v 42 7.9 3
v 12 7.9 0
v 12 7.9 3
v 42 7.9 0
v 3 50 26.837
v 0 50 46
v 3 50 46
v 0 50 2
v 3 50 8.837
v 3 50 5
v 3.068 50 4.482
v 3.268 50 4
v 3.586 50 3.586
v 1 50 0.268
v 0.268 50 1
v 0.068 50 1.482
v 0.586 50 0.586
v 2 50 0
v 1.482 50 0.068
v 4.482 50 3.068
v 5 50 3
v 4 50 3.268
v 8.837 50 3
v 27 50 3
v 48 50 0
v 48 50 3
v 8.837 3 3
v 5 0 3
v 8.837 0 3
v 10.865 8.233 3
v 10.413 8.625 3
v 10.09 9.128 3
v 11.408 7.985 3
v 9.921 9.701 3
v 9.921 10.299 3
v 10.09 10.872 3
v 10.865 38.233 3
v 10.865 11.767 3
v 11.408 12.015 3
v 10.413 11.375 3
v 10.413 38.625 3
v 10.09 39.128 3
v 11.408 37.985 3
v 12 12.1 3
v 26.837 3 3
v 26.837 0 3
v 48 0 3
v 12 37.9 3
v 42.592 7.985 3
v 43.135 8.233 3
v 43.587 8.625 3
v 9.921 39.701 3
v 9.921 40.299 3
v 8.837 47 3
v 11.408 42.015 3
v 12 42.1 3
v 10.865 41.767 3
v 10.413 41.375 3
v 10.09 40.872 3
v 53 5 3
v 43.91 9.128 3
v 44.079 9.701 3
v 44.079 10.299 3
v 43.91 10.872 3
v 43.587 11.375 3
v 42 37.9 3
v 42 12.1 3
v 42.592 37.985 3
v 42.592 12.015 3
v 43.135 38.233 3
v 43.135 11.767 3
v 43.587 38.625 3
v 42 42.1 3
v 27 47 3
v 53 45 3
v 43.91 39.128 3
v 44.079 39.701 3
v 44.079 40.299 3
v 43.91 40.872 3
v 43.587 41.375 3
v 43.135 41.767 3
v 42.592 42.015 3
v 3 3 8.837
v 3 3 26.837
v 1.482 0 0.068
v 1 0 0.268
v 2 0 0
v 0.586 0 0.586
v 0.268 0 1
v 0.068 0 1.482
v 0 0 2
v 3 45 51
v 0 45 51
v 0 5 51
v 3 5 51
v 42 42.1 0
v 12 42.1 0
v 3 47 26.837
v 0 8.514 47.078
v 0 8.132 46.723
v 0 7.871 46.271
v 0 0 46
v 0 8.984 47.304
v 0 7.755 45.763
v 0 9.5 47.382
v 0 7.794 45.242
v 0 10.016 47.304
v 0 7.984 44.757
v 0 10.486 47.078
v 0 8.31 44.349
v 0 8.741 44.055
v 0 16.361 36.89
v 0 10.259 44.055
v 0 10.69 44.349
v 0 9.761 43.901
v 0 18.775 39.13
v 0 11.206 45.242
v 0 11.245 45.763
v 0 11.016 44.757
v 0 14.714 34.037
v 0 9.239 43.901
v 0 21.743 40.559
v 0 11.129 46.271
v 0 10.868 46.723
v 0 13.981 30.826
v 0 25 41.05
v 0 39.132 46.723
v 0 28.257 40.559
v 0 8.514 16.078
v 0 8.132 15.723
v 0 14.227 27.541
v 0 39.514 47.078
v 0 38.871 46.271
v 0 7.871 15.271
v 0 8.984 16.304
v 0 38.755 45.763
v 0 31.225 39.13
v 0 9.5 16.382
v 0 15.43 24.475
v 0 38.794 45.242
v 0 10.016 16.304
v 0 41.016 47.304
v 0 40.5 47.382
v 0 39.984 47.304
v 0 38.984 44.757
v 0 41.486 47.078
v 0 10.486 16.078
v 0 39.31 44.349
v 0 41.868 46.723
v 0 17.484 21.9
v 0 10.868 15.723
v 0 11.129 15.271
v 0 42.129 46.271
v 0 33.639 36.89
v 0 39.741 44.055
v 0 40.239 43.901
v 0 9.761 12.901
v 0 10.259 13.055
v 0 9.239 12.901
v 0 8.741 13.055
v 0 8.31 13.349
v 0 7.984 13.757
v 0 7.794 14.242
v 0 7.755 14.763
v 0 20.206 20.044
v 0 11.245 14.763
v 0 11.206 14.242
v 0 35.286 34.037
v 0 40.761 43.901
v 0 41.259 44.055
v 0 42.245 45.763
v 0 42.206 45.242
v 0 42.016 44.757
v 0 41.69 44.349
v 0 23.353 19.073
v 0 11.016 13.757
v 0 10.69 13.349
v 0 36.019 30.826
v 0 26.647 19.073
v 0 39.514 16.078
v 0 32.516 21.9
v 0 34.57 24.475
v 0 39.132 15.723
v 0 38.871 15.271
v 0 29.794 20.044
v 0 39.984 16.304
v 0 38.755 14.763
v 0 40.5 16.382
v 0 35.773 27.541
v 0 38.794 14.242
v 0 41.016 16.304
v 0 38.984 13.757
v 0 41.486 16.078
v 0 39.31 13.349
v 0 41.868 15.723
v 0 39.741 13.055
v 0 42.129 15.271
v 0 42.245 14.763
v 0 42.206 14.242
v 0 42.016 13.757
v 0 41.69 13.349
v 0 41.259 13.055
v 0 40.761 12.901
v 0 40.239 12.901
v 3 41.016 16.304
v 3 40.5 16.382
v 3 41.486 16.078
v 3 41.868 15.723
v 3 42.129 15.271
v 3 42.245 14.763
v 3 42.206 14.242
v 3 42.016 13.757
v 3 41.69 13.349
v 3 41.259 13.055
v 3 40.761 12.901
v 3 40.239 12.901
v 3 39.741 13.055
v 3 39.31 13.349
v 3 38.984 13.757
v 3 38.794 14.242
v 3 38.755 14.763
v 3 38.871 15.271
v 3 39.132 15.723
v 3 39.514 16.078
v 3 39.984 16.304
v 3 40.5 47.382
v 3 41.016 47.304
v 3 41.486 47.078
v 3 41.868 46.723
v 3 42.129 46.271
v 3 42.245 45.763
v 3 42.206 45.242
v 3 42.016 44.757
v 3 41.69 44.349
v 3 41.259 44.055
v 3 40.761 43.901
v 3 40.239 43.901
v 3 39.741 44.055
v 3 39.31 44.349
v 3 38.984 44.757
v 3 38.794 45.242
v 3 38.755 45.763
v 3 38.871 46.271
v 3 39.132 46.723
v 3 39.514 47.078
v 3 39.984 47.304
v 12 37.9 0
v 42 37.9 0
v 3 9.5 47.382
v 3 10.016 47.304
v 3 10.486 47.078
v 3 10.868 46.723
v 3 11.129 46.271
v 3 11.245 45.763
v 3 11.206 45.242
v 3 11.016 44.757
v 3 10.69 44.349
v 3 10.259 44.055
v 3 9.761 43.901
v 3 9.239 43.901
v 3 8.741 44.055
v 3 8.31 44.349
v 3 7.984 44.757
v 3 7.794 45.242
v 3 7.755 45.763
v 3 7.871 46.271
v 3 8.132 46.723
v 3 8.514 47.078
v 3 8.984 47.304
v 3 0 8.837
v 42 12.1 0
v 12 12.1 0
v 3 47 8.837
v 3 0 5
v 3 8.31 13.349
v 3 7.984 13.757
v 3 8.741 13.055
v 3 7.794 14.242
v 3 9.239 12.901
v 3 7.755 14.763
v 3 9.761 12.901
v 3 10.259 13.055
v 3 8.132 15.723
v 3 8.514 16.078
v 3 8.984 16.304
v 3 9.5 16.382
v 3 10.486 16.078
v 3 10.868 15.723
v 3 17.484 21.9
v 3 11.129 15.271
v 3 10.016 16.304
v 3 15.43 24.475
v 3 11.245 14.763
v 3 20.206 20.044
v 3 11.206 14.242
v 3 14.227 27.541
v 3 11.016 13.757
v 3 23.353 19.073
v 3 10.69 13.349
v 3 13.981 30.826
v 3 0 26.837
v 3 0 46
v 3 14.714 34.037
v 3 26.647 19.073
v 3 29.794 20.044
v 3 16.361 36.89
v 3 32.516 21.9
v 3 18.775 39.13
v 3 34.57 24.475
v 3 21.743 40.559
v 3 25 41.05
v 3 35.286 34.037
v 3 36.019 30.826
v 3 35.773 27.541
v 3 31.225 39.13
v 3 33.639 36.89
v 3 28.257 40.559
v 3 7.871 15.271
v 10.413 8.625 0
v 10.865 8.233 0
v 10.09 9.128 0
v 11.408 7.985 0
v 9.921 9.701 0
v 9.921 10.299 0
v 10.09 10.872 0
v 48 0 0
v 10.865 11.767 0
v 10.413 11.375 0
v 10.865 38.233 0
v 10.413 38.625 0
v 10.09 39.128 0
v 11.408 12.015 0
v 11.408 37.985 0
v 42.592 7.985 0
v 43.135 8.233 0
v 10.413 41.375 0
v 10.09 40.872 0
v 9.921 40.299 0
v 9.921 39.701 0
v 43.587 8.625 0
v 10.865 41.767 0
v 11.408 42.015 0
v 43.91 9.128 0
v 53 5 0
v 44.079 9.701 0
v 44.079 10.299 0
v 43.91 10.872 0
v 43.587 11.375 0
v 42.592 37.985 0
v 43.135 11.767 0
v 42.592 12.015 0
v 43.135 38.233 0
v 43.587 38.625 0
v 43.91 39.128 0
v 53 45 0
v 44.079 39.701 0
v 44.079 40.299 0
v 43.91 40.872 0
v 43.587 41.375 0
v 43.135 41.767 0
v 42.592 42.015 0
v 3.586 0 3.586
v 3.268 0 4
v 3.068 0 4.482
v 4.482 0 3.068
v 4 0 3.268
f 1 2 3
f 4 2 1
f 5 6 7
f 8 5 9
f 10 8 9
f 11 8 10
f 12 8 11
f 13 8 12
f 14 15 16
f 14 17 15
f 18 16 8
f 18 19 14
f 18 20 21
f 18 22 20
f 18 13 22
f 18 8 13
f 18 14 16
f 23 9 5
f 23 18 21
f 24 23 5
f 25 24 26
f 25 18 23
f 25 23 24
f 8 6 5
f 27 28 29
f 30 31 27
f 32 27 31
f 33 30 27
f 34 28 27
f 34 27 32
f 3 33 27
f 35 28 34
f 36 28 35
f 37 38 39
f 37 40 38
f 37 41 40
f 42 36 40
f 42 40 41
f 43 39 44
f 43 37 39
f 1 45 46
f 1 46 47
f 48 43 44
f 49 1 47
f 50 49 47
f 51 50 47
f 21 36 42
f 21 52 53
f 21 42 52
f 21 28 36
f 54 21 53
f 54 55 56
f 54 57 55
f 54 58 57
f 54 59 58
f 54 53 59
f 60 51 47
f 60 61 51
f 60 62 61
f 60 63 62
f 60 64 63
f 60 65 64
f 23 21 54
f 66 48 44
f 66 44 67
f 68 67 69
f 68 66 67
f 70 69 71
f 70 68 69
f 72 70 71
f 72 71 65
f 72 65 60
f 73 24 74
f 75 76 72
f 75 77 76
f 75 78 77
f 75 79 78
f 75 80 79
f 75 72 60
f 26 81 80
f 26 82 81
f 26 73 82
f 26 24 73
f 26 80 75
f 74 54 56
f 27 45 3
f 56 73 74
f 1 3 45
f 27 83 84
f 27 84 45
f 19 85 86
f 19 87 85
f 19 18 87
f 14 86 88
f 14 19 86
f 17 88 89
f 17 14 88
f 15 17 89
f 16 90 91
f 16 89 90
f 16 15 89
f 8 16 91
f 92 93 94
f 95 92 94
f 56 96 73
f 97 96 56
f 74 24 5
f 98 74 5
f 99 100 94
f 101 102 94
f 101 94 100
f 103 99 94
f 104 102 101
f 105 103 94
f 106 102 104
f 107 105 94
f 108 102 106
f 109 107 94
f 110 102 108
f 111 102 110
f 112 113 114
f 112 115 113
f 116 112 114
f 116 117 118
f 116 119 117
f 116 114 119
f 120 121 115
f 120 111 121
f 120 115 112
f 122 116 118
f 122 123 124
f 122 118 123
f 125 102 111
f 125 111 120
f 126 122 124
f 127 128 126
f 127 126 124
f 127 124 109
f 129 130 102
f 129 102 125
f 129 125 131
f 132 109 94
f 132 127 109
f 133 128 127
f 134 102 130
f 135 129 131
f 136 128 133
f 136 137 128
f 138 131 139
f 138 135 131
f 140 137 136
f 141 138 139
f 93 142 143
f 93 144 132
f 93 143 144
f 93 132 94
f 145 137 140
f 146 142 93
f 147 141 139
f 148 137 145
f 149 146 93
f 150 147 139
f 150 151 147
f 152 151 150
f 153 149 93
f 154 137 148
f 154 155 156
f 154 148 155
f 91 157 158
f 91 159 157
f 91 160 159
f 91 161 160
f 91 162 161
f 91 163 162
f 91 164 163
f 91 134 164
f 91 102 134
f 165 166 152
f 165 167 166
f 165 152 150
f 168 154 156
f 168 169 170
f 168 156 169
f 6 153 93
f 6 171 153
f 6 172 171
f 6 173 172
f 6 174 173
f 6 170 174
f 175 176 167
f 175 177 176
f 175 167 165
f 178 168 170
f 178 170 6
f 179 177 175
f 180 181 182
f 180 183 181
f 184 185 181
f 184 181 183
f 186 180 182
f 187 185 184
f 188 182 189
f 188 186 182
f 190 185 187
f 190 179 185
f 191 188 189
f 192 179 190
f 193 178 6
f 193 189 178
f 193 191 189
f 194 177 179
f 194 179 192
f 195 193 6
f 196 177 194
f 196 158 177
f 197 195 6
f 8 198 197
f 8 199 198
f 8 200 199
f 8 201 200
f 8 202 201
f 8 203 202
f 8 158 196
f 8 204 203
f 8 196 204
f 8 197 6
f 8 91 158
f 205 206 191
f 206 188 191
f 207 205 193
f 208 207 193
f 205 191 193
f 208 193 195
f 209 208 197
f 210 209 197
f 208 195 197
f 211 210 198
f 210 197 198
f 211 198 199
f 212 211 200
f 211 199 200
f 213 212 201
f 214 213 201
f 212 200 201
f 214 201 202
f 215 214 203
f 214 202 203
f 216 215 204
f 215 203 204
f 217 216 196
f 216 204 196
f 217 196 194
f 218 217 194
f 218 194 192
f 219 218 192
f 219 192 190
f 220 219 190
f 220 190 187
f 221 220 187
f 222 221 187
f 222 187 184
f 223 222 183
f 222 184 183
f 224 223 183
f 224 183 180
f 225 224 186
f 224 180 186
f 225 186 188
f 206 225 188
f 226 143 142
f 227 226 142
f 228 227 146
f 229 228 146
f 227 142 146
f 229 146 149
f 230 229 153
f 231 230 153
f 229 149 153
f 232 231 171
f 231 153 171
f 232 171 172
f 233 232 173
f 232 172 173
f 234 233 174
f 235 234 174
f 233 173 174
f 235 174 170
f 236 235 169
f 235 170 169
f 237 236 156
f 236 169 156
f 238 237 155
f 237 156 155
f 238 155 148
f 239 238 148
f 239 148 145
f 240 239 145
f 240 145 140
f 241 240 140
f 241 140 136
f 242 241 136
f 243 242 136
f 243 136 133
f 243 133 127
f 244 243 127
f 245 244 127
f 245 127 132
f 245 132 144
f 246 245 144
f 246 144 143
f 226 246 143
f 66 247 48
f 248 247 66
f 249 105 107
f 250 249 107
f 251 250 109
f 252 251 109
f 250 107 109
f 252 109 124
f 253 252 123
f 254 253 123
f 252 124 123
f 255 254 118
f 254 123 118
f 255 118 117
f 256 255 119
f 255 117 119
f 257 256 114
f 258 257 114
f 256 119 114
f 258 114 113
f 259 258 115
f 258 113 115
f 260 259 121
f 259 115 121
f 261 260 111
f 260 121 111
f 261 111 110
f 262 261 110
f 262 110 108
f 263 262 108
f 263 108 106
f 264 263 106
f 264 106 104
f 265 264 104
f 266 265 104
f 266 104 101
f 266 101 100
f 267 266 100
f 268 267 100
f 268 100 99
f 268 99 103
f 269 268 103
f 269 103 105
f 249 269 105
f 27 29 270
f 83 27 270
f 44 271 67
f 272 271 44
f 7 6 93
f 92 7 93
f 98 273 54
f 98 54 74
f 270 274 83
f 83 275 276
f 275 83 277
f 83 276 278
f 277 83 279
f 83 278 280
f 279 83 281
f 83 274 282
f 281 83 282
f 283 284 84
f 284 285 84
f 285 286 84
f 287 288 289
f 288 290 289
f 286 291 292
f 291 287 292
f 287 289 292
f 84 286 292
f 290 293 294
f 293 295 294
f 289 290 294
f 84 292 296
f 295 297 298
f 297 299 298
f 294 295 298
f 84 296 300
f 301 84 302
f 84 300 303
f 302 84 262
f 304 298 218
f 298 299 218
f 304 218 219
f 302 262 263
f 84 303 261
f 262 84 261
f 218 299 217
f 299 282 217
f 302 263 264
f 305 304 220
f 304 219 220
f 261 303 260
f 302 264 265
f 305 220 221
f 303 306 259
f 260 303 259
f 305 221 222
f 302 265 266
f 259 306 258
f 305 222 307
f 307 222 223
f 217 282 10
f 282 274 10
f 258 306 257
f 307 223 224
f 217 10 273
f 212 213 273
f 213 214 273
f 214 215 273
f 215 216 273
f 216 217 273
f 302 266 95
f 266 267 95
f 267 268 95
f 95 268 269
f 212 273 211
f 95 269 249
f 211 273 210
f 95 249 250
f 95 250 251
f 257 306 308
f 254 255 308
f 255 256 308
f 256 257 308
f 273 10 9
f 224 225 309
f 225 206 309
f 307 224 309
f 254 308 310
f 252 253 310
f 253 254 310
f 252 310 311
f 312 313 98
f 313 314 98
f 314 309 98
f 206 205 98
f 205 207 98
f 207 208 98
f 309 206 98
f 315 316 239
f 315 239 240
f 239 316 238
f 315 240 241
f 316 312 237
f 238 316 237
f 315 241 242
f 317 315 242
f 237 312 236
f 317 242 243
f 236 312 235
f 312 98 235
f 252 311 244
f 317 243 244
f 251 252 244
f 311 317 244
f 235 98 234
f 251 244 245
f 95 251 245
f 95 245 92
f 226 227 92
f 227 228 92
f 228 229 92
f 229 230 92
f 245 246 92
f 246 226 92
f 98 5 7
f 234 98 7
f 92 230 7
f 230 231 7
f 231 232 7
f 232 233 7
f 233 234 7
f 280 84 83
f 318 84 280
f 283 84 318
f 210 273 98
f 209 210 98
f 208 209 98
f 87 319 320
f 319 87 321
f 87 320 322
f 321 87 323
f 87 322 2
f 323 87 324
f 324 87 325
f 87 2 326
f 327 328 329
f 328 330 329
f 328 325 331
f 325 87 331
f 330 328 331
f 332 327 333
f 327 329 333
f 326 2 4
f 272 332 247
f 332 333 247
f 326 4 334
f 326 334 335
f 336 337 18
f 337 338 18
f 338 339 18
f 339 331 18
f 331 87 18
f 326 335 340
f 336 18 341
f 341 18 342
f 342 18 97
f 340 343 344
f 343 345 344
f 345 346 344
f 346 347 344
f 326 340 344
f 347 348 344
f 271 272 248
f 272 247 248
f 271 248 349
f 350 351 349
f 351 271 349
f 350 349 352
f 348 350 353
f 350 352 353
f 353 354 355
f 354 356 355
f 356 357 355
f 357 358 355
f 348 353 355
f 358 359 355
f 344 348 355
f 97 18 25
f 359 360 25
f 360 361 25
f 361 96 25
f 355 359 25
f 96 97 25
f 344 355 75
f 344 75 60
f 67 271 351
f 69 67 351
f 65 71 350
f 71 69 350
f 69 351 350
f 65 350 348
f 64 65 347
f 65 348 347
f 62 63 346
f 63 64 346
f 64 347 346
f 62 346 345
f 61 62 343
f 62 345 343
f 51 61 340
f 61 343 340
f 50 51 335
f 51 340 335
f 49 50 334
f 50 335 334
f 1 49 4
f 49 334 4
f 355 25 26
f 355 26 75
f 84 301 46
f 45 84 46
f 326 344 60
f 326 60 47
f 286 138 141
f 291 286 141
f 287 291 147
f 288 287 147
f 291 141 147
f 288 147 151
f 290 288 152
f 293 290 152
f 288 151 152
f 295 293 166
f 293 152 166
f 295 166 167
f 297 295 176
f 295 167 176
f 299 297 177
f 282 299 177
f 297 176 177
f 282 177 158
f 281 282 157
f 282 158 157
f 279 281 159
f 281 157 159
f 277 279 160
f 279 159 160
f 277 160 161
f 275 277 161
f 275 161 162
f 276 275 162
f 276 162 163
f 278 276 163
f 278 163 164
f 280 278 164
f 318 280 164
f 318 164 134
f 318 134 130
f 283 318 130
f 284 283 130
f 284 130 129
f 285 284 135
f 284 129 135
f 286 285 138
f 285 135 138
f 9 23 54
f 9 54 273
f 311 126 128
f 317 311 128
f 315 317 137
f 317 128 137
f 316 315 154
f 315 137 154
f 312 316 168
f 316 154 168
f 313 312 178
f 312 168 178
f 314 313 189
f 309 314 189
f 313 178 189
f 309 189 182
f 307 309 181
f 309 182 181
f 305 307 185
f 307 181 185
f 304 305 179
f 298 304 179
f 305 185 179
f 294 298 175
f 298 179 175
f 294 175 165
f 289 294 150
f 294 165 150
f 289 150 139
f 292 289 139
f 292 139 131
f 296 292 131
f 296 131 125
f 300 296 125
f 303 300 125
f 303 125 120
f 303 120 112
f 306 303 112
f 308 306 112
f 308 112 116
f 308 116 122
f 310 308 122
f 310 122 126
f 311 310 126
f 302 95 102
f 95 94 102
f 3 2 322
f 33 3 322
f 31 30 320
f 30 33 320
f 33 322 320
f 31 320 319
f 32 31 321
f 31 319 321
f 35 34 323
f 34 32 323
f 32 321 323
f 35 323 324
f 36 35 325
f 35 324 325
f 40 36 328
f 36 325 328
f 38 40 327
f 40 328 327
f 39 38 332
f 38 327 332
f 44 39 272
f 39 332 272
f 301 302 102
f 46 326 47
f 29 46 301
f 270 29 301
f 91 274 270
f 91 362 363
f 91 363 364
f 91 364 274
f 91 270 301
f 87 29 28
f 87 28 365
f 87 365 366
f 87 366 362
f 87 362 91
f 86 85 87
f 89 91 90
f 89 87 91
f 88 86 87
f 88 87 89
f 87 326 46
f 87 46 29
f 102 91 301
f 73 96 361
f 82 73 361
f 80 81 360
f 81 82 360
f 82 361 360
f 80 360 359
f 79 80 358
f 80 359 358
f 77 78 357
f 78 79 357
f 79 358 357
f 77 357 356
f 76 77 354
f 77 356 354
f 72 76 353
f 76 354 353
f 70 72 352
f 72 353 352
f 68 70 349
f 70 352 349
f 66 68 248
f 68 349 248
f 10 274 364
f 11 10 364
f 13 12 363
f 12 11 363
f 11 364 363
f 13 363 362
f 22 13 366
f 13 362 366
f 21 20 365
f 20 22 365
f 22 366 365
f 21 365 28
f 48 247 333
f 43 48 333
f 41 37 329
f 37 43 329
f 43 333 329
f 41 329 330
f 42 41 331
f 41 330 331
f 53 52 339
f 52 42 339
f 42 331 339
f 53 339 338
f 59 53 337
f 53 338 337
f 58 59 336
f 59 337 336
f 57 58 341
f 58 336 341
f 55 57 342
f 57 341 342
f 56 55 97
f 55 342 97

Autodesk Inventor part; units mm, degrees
ref_plane "YZ Plane" through (0, 0, 0) normal (1, 0, 0) x (0, 1, 0)
ref_plane "XZ Plane" through (0, 0, 0) normal (0, 1, 0) x (-1, 0, 0)
ref_plane "XY Plane" through (0, 0, 0) normal (0, 0, 1) x (1, 0, 0)
sketch "Skizze1" plane through (0, 0, 0) normal (0, 0, 1) x (1, 0, 0)
  line L0 (0, 0) -> (0, 50)
  line L1 (0, 50) -> (48, 50)
  line L2 (53, 45) -> (53, 5)
  line L3 (48, 0) -> (0, 0)
  line L4 (12, 40) -> (42, 40) construction
  line L5 (12, 37.9) -> (42, 37.9)
  line L6 (42, 42.1) -> (12, 42.1)
  arc A0 (12, 42.1) -> (12, 37.9) centre (12, 40) ccw
  arc A1 (42, 37.9) -> (42, 42.1) centre (42, 40) ccw
  line L7 (12, 10) -> (42, 10) construction
  line L8 (12, 7.9) -> (42, 7.9)
  line L9 (42, 12.1) -> (12, 12.1)
  arc A2 (12, 12.1) -> (12, 7.9) centre (12, 10) ccw
  arc A3 (42, 7.9) -> (42, 12.1) centre (42, 10) ccw
  line L10 (48, 50) -> (53, 45)
  line L11 (53, 5) -> (48, 0)
  point P0 (53, 50)
  point P1 (53, 0)
  point P2 (27, 40)
  point P3 (27, 10)
  dimension "d0" = 50
  dimension "d1" = 53
  dimension "d2" = 30
  dimension "d3" = 4.2
  dimension "d4" = 10
  dimension "d5" = 11
  dimension "d6" = 4.2
  dimension "d7" = 10
  dimension "d8" = 11
  dimension "d9" = 5
  dimension "d10" = 5
  dimension "d11" = 5
  dimension "d12" = 5
extrude "Extrusion1" add sketch "Skizze1" along normal blind 3
sketch "Skizze2" plane through (0, 0, 0) normal (-1, 0, 0) x (0, 0, 1)
  line L0 (0, 50) -> (3, 50) projected
  line L1 (0, 50) -> (46, 50)
  line L2 (51, 45) -> (51, 5)
  line L3 (46, 0) -> (0, 0)
  line L4 (0, 0) -> (0, 50)
  line L5 (46, 50) -> (51, 45)
  line L6 (51, 5) -> (46, 0)
  circle A0 centre (30, 25) radius 11.05
  circle A1 centre (45.6319, 40.5) radius 1.75
  circle A2 centre (45.6319, 9.5) radius 1.75
  circle A3 centre (14.6319, 9.5) radius 1.75
  circle A4 centre (14.6319, 40.5) radius 1.75
  line L7 (30.1319, 50) -> (30.1319, 0) construction
  line L8 (51, 25) -> (0, 25) construction
  point P0 (51, 0)
  point P1 (51, 50)
  dimension "d15" = 51
  dimension "d16" = 5
  dimension "d17" = 5
  dimension "d18" = 5
  dimension "d19" = 5
  dimension "d20" = 22.1
  dimension "d21" = 3.5
  dimension "d22" = 21
  dimension "d23" = 3.5
  dimension "d24" = 3.5
  dimension "d25" = 3.5
  dimension "d26" = 31
  dimension "d27" = 31
  dimension "d28" = 31
  dimension "d29" = 31
  dimension "d30" = 15.5
  dimension "d31" = 15.5
  dimension "d32" = 15.5
  dimension "d33" = 15.5
extrude "Extrusion2" add sketch "Skizze2" against normal blind 3
sketch "Skizze3" plane through (0, 0, 0) normal (0, -1, 0) x (1, 0, 0)
  line L0 (3, 3) -> (48, 3) projected
  line L1 (8.8368, 3) -> (3, 8.8368)
  line L2 (8.8368, 3) -> (17.0913, 3) construction
  line L3 (3, 8.8368) -> (3, 26.8368)
  line L4 (3, 46) -> (3, 3) projected
  line L5 (3, 26.8368) -> (26.8368, 3)
  line L6 (42, 3) -> (12, 3) projected
  line L7 (26.8368, 3) -> (8.8368, 3)
  point P0 (0, 0)
  dimension "d36" = 135
  dimension "d37" = 18
  dimension "d38" = 45
extrude "Extrusion3" add sketch "Skizze3" against normal blind 3 contours L1 L3 L5 L0
sketch "Skizze4" plane through (0, 50, 0) normal (0, 1, 0) x (1, 0, 0)
  line L0 (42, -3) -> (12, -3) projected
  line L1 (3, -46) -> (3, -26.8368) projected
  line L2 (27, -3) -> (3, -26.8368)
  line L3 (8.8368, -3) -> (3, -8.8368) projected
  line L4 (3, -26.8368) -> (3, -8.8368)
  line L5 (3, -8.8368) -> (8.8368, -3)
  line L6 (8.8368, -3) -> (27, -3)
  point P0 (0, 0)
extrude "Extrusion4" add sketch "Skizze4" against normal blind 3
fillet "Rundung1" radius 2 2 edges at (0, 25, 0) (3, 25, 3)
equation "\"d12\" = d11"
equation "\"d17\" = d16"
equation "\"d18\" = d16"
equation "\"d19\" = d18"
properties part number "Motor mount NEMA 17" material "Stahl, unlegiert"
